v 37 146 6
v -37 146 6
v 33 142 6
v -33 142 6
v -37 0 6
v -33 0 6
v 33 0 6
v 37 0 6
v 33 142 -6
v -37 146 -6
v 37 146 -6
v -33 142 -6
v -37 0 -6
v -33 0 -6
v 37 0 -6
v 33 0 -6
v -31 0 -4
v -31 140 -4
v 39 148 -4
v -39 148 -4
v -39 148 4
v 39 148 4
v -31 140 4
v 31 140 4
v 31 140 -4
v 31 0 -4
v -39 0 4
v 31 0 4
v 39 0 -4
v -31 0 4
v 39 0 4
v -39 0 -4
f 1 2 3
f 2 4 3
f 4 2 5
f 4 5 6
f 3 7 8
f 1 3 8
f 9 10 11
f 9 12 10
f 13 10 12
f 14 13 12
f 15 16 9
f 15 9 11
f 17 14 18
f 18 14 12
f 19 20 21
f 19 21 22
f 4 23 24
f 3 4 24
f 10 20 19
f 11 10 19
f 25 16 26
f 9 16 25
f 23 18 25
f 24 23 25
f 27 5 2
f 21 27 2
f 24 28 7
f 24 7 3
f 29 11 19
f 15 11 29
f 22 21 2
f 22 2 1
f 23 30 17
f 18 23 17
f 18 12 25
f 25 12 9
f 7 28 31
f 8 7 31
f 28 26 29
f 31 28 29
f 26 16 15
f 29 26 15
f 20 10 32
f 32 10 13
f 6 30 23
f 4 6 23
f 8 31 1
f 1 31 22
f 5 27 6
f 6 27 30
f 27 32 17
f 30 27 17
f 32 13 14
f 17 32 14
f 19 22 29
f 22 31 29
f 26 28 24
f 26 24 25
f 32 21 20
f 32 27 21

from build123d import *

# Parameters (mm, degrees)
SKETCH1_W             = 8
SKETCH1_H             = 12
BOSS_EXTRUDE1_DEPTH   = 140
BOSS_EXTRUDE1_2_DEPTH = 140
SKETCH2_W             = 78
SKETCH2_H             = 12
BOSS_EXTRUDE2_DEPTH   = 8
CHAMFER1_SIZE         = 2


with BuildPart() as part:
    # Sketch1 → Boss-Extrude1 (new body)
    with BuildSketch(Plane(origin=(0, 0, 0), x_dir=(1, 0, 0), z_dir=(0, 1, 0))):
        with Locations((-35, 0)):
            Rectangle(SKETCH1_W, SKETCH1_H)
    extrude(amount=BOSS_EXTRUDE1_DEPTH)



with BuildPart() as body_2:
    # Sketch1 → Boss-Extrude1 2 (new body)
    with BuildSketch(Plane(origin=(0, 0, 0), x_dir=(1, 0, 0), z_dir=(0, 1, 0))):
        with Locations((35, 0)):
            Rectangle(SKETCH1_W, SKETCH1_H)
    extrude(amount=BOSS_EXTRUDE1_2_DEPTH)


with BuildPart() as part_1:
    add(part.part)

    add(body_2.part)  # Boss-Extrude2 merges body 2
    # Sketch2 → Boss-Extrude2 (add)
    with BuildSketch(Plane(origin=(0, 140, 0), x_dir=(1, 0, 0), z_dir=(0, 1, 0))):
        Rectangle(SKETCH2_W, SKETCH2_H)
    extrude(amount=BOSS_EXTRUDE2_DEPTH)

    # Chamfer1
    chamfer1_edges = [part_1.edges().sort_by_distance(p)[0] for p in [
        (0, 140, 6),
        (39, 74, 6),
        (39, 74, -6),
        (0, 148, 6),
        (0, 148, -6),
        (0, 140, -6),
        (31, 70, -6),
        (31, 70, 6),
        (-31, 70, 6),
        (-39, 74, 6),
        (-39, 74, -6),
        (-31, 70, -6),
    ]]
    chamfer(chamfer1_edges, length=CHAMFER1_SIZE)


solid = part_1.part
